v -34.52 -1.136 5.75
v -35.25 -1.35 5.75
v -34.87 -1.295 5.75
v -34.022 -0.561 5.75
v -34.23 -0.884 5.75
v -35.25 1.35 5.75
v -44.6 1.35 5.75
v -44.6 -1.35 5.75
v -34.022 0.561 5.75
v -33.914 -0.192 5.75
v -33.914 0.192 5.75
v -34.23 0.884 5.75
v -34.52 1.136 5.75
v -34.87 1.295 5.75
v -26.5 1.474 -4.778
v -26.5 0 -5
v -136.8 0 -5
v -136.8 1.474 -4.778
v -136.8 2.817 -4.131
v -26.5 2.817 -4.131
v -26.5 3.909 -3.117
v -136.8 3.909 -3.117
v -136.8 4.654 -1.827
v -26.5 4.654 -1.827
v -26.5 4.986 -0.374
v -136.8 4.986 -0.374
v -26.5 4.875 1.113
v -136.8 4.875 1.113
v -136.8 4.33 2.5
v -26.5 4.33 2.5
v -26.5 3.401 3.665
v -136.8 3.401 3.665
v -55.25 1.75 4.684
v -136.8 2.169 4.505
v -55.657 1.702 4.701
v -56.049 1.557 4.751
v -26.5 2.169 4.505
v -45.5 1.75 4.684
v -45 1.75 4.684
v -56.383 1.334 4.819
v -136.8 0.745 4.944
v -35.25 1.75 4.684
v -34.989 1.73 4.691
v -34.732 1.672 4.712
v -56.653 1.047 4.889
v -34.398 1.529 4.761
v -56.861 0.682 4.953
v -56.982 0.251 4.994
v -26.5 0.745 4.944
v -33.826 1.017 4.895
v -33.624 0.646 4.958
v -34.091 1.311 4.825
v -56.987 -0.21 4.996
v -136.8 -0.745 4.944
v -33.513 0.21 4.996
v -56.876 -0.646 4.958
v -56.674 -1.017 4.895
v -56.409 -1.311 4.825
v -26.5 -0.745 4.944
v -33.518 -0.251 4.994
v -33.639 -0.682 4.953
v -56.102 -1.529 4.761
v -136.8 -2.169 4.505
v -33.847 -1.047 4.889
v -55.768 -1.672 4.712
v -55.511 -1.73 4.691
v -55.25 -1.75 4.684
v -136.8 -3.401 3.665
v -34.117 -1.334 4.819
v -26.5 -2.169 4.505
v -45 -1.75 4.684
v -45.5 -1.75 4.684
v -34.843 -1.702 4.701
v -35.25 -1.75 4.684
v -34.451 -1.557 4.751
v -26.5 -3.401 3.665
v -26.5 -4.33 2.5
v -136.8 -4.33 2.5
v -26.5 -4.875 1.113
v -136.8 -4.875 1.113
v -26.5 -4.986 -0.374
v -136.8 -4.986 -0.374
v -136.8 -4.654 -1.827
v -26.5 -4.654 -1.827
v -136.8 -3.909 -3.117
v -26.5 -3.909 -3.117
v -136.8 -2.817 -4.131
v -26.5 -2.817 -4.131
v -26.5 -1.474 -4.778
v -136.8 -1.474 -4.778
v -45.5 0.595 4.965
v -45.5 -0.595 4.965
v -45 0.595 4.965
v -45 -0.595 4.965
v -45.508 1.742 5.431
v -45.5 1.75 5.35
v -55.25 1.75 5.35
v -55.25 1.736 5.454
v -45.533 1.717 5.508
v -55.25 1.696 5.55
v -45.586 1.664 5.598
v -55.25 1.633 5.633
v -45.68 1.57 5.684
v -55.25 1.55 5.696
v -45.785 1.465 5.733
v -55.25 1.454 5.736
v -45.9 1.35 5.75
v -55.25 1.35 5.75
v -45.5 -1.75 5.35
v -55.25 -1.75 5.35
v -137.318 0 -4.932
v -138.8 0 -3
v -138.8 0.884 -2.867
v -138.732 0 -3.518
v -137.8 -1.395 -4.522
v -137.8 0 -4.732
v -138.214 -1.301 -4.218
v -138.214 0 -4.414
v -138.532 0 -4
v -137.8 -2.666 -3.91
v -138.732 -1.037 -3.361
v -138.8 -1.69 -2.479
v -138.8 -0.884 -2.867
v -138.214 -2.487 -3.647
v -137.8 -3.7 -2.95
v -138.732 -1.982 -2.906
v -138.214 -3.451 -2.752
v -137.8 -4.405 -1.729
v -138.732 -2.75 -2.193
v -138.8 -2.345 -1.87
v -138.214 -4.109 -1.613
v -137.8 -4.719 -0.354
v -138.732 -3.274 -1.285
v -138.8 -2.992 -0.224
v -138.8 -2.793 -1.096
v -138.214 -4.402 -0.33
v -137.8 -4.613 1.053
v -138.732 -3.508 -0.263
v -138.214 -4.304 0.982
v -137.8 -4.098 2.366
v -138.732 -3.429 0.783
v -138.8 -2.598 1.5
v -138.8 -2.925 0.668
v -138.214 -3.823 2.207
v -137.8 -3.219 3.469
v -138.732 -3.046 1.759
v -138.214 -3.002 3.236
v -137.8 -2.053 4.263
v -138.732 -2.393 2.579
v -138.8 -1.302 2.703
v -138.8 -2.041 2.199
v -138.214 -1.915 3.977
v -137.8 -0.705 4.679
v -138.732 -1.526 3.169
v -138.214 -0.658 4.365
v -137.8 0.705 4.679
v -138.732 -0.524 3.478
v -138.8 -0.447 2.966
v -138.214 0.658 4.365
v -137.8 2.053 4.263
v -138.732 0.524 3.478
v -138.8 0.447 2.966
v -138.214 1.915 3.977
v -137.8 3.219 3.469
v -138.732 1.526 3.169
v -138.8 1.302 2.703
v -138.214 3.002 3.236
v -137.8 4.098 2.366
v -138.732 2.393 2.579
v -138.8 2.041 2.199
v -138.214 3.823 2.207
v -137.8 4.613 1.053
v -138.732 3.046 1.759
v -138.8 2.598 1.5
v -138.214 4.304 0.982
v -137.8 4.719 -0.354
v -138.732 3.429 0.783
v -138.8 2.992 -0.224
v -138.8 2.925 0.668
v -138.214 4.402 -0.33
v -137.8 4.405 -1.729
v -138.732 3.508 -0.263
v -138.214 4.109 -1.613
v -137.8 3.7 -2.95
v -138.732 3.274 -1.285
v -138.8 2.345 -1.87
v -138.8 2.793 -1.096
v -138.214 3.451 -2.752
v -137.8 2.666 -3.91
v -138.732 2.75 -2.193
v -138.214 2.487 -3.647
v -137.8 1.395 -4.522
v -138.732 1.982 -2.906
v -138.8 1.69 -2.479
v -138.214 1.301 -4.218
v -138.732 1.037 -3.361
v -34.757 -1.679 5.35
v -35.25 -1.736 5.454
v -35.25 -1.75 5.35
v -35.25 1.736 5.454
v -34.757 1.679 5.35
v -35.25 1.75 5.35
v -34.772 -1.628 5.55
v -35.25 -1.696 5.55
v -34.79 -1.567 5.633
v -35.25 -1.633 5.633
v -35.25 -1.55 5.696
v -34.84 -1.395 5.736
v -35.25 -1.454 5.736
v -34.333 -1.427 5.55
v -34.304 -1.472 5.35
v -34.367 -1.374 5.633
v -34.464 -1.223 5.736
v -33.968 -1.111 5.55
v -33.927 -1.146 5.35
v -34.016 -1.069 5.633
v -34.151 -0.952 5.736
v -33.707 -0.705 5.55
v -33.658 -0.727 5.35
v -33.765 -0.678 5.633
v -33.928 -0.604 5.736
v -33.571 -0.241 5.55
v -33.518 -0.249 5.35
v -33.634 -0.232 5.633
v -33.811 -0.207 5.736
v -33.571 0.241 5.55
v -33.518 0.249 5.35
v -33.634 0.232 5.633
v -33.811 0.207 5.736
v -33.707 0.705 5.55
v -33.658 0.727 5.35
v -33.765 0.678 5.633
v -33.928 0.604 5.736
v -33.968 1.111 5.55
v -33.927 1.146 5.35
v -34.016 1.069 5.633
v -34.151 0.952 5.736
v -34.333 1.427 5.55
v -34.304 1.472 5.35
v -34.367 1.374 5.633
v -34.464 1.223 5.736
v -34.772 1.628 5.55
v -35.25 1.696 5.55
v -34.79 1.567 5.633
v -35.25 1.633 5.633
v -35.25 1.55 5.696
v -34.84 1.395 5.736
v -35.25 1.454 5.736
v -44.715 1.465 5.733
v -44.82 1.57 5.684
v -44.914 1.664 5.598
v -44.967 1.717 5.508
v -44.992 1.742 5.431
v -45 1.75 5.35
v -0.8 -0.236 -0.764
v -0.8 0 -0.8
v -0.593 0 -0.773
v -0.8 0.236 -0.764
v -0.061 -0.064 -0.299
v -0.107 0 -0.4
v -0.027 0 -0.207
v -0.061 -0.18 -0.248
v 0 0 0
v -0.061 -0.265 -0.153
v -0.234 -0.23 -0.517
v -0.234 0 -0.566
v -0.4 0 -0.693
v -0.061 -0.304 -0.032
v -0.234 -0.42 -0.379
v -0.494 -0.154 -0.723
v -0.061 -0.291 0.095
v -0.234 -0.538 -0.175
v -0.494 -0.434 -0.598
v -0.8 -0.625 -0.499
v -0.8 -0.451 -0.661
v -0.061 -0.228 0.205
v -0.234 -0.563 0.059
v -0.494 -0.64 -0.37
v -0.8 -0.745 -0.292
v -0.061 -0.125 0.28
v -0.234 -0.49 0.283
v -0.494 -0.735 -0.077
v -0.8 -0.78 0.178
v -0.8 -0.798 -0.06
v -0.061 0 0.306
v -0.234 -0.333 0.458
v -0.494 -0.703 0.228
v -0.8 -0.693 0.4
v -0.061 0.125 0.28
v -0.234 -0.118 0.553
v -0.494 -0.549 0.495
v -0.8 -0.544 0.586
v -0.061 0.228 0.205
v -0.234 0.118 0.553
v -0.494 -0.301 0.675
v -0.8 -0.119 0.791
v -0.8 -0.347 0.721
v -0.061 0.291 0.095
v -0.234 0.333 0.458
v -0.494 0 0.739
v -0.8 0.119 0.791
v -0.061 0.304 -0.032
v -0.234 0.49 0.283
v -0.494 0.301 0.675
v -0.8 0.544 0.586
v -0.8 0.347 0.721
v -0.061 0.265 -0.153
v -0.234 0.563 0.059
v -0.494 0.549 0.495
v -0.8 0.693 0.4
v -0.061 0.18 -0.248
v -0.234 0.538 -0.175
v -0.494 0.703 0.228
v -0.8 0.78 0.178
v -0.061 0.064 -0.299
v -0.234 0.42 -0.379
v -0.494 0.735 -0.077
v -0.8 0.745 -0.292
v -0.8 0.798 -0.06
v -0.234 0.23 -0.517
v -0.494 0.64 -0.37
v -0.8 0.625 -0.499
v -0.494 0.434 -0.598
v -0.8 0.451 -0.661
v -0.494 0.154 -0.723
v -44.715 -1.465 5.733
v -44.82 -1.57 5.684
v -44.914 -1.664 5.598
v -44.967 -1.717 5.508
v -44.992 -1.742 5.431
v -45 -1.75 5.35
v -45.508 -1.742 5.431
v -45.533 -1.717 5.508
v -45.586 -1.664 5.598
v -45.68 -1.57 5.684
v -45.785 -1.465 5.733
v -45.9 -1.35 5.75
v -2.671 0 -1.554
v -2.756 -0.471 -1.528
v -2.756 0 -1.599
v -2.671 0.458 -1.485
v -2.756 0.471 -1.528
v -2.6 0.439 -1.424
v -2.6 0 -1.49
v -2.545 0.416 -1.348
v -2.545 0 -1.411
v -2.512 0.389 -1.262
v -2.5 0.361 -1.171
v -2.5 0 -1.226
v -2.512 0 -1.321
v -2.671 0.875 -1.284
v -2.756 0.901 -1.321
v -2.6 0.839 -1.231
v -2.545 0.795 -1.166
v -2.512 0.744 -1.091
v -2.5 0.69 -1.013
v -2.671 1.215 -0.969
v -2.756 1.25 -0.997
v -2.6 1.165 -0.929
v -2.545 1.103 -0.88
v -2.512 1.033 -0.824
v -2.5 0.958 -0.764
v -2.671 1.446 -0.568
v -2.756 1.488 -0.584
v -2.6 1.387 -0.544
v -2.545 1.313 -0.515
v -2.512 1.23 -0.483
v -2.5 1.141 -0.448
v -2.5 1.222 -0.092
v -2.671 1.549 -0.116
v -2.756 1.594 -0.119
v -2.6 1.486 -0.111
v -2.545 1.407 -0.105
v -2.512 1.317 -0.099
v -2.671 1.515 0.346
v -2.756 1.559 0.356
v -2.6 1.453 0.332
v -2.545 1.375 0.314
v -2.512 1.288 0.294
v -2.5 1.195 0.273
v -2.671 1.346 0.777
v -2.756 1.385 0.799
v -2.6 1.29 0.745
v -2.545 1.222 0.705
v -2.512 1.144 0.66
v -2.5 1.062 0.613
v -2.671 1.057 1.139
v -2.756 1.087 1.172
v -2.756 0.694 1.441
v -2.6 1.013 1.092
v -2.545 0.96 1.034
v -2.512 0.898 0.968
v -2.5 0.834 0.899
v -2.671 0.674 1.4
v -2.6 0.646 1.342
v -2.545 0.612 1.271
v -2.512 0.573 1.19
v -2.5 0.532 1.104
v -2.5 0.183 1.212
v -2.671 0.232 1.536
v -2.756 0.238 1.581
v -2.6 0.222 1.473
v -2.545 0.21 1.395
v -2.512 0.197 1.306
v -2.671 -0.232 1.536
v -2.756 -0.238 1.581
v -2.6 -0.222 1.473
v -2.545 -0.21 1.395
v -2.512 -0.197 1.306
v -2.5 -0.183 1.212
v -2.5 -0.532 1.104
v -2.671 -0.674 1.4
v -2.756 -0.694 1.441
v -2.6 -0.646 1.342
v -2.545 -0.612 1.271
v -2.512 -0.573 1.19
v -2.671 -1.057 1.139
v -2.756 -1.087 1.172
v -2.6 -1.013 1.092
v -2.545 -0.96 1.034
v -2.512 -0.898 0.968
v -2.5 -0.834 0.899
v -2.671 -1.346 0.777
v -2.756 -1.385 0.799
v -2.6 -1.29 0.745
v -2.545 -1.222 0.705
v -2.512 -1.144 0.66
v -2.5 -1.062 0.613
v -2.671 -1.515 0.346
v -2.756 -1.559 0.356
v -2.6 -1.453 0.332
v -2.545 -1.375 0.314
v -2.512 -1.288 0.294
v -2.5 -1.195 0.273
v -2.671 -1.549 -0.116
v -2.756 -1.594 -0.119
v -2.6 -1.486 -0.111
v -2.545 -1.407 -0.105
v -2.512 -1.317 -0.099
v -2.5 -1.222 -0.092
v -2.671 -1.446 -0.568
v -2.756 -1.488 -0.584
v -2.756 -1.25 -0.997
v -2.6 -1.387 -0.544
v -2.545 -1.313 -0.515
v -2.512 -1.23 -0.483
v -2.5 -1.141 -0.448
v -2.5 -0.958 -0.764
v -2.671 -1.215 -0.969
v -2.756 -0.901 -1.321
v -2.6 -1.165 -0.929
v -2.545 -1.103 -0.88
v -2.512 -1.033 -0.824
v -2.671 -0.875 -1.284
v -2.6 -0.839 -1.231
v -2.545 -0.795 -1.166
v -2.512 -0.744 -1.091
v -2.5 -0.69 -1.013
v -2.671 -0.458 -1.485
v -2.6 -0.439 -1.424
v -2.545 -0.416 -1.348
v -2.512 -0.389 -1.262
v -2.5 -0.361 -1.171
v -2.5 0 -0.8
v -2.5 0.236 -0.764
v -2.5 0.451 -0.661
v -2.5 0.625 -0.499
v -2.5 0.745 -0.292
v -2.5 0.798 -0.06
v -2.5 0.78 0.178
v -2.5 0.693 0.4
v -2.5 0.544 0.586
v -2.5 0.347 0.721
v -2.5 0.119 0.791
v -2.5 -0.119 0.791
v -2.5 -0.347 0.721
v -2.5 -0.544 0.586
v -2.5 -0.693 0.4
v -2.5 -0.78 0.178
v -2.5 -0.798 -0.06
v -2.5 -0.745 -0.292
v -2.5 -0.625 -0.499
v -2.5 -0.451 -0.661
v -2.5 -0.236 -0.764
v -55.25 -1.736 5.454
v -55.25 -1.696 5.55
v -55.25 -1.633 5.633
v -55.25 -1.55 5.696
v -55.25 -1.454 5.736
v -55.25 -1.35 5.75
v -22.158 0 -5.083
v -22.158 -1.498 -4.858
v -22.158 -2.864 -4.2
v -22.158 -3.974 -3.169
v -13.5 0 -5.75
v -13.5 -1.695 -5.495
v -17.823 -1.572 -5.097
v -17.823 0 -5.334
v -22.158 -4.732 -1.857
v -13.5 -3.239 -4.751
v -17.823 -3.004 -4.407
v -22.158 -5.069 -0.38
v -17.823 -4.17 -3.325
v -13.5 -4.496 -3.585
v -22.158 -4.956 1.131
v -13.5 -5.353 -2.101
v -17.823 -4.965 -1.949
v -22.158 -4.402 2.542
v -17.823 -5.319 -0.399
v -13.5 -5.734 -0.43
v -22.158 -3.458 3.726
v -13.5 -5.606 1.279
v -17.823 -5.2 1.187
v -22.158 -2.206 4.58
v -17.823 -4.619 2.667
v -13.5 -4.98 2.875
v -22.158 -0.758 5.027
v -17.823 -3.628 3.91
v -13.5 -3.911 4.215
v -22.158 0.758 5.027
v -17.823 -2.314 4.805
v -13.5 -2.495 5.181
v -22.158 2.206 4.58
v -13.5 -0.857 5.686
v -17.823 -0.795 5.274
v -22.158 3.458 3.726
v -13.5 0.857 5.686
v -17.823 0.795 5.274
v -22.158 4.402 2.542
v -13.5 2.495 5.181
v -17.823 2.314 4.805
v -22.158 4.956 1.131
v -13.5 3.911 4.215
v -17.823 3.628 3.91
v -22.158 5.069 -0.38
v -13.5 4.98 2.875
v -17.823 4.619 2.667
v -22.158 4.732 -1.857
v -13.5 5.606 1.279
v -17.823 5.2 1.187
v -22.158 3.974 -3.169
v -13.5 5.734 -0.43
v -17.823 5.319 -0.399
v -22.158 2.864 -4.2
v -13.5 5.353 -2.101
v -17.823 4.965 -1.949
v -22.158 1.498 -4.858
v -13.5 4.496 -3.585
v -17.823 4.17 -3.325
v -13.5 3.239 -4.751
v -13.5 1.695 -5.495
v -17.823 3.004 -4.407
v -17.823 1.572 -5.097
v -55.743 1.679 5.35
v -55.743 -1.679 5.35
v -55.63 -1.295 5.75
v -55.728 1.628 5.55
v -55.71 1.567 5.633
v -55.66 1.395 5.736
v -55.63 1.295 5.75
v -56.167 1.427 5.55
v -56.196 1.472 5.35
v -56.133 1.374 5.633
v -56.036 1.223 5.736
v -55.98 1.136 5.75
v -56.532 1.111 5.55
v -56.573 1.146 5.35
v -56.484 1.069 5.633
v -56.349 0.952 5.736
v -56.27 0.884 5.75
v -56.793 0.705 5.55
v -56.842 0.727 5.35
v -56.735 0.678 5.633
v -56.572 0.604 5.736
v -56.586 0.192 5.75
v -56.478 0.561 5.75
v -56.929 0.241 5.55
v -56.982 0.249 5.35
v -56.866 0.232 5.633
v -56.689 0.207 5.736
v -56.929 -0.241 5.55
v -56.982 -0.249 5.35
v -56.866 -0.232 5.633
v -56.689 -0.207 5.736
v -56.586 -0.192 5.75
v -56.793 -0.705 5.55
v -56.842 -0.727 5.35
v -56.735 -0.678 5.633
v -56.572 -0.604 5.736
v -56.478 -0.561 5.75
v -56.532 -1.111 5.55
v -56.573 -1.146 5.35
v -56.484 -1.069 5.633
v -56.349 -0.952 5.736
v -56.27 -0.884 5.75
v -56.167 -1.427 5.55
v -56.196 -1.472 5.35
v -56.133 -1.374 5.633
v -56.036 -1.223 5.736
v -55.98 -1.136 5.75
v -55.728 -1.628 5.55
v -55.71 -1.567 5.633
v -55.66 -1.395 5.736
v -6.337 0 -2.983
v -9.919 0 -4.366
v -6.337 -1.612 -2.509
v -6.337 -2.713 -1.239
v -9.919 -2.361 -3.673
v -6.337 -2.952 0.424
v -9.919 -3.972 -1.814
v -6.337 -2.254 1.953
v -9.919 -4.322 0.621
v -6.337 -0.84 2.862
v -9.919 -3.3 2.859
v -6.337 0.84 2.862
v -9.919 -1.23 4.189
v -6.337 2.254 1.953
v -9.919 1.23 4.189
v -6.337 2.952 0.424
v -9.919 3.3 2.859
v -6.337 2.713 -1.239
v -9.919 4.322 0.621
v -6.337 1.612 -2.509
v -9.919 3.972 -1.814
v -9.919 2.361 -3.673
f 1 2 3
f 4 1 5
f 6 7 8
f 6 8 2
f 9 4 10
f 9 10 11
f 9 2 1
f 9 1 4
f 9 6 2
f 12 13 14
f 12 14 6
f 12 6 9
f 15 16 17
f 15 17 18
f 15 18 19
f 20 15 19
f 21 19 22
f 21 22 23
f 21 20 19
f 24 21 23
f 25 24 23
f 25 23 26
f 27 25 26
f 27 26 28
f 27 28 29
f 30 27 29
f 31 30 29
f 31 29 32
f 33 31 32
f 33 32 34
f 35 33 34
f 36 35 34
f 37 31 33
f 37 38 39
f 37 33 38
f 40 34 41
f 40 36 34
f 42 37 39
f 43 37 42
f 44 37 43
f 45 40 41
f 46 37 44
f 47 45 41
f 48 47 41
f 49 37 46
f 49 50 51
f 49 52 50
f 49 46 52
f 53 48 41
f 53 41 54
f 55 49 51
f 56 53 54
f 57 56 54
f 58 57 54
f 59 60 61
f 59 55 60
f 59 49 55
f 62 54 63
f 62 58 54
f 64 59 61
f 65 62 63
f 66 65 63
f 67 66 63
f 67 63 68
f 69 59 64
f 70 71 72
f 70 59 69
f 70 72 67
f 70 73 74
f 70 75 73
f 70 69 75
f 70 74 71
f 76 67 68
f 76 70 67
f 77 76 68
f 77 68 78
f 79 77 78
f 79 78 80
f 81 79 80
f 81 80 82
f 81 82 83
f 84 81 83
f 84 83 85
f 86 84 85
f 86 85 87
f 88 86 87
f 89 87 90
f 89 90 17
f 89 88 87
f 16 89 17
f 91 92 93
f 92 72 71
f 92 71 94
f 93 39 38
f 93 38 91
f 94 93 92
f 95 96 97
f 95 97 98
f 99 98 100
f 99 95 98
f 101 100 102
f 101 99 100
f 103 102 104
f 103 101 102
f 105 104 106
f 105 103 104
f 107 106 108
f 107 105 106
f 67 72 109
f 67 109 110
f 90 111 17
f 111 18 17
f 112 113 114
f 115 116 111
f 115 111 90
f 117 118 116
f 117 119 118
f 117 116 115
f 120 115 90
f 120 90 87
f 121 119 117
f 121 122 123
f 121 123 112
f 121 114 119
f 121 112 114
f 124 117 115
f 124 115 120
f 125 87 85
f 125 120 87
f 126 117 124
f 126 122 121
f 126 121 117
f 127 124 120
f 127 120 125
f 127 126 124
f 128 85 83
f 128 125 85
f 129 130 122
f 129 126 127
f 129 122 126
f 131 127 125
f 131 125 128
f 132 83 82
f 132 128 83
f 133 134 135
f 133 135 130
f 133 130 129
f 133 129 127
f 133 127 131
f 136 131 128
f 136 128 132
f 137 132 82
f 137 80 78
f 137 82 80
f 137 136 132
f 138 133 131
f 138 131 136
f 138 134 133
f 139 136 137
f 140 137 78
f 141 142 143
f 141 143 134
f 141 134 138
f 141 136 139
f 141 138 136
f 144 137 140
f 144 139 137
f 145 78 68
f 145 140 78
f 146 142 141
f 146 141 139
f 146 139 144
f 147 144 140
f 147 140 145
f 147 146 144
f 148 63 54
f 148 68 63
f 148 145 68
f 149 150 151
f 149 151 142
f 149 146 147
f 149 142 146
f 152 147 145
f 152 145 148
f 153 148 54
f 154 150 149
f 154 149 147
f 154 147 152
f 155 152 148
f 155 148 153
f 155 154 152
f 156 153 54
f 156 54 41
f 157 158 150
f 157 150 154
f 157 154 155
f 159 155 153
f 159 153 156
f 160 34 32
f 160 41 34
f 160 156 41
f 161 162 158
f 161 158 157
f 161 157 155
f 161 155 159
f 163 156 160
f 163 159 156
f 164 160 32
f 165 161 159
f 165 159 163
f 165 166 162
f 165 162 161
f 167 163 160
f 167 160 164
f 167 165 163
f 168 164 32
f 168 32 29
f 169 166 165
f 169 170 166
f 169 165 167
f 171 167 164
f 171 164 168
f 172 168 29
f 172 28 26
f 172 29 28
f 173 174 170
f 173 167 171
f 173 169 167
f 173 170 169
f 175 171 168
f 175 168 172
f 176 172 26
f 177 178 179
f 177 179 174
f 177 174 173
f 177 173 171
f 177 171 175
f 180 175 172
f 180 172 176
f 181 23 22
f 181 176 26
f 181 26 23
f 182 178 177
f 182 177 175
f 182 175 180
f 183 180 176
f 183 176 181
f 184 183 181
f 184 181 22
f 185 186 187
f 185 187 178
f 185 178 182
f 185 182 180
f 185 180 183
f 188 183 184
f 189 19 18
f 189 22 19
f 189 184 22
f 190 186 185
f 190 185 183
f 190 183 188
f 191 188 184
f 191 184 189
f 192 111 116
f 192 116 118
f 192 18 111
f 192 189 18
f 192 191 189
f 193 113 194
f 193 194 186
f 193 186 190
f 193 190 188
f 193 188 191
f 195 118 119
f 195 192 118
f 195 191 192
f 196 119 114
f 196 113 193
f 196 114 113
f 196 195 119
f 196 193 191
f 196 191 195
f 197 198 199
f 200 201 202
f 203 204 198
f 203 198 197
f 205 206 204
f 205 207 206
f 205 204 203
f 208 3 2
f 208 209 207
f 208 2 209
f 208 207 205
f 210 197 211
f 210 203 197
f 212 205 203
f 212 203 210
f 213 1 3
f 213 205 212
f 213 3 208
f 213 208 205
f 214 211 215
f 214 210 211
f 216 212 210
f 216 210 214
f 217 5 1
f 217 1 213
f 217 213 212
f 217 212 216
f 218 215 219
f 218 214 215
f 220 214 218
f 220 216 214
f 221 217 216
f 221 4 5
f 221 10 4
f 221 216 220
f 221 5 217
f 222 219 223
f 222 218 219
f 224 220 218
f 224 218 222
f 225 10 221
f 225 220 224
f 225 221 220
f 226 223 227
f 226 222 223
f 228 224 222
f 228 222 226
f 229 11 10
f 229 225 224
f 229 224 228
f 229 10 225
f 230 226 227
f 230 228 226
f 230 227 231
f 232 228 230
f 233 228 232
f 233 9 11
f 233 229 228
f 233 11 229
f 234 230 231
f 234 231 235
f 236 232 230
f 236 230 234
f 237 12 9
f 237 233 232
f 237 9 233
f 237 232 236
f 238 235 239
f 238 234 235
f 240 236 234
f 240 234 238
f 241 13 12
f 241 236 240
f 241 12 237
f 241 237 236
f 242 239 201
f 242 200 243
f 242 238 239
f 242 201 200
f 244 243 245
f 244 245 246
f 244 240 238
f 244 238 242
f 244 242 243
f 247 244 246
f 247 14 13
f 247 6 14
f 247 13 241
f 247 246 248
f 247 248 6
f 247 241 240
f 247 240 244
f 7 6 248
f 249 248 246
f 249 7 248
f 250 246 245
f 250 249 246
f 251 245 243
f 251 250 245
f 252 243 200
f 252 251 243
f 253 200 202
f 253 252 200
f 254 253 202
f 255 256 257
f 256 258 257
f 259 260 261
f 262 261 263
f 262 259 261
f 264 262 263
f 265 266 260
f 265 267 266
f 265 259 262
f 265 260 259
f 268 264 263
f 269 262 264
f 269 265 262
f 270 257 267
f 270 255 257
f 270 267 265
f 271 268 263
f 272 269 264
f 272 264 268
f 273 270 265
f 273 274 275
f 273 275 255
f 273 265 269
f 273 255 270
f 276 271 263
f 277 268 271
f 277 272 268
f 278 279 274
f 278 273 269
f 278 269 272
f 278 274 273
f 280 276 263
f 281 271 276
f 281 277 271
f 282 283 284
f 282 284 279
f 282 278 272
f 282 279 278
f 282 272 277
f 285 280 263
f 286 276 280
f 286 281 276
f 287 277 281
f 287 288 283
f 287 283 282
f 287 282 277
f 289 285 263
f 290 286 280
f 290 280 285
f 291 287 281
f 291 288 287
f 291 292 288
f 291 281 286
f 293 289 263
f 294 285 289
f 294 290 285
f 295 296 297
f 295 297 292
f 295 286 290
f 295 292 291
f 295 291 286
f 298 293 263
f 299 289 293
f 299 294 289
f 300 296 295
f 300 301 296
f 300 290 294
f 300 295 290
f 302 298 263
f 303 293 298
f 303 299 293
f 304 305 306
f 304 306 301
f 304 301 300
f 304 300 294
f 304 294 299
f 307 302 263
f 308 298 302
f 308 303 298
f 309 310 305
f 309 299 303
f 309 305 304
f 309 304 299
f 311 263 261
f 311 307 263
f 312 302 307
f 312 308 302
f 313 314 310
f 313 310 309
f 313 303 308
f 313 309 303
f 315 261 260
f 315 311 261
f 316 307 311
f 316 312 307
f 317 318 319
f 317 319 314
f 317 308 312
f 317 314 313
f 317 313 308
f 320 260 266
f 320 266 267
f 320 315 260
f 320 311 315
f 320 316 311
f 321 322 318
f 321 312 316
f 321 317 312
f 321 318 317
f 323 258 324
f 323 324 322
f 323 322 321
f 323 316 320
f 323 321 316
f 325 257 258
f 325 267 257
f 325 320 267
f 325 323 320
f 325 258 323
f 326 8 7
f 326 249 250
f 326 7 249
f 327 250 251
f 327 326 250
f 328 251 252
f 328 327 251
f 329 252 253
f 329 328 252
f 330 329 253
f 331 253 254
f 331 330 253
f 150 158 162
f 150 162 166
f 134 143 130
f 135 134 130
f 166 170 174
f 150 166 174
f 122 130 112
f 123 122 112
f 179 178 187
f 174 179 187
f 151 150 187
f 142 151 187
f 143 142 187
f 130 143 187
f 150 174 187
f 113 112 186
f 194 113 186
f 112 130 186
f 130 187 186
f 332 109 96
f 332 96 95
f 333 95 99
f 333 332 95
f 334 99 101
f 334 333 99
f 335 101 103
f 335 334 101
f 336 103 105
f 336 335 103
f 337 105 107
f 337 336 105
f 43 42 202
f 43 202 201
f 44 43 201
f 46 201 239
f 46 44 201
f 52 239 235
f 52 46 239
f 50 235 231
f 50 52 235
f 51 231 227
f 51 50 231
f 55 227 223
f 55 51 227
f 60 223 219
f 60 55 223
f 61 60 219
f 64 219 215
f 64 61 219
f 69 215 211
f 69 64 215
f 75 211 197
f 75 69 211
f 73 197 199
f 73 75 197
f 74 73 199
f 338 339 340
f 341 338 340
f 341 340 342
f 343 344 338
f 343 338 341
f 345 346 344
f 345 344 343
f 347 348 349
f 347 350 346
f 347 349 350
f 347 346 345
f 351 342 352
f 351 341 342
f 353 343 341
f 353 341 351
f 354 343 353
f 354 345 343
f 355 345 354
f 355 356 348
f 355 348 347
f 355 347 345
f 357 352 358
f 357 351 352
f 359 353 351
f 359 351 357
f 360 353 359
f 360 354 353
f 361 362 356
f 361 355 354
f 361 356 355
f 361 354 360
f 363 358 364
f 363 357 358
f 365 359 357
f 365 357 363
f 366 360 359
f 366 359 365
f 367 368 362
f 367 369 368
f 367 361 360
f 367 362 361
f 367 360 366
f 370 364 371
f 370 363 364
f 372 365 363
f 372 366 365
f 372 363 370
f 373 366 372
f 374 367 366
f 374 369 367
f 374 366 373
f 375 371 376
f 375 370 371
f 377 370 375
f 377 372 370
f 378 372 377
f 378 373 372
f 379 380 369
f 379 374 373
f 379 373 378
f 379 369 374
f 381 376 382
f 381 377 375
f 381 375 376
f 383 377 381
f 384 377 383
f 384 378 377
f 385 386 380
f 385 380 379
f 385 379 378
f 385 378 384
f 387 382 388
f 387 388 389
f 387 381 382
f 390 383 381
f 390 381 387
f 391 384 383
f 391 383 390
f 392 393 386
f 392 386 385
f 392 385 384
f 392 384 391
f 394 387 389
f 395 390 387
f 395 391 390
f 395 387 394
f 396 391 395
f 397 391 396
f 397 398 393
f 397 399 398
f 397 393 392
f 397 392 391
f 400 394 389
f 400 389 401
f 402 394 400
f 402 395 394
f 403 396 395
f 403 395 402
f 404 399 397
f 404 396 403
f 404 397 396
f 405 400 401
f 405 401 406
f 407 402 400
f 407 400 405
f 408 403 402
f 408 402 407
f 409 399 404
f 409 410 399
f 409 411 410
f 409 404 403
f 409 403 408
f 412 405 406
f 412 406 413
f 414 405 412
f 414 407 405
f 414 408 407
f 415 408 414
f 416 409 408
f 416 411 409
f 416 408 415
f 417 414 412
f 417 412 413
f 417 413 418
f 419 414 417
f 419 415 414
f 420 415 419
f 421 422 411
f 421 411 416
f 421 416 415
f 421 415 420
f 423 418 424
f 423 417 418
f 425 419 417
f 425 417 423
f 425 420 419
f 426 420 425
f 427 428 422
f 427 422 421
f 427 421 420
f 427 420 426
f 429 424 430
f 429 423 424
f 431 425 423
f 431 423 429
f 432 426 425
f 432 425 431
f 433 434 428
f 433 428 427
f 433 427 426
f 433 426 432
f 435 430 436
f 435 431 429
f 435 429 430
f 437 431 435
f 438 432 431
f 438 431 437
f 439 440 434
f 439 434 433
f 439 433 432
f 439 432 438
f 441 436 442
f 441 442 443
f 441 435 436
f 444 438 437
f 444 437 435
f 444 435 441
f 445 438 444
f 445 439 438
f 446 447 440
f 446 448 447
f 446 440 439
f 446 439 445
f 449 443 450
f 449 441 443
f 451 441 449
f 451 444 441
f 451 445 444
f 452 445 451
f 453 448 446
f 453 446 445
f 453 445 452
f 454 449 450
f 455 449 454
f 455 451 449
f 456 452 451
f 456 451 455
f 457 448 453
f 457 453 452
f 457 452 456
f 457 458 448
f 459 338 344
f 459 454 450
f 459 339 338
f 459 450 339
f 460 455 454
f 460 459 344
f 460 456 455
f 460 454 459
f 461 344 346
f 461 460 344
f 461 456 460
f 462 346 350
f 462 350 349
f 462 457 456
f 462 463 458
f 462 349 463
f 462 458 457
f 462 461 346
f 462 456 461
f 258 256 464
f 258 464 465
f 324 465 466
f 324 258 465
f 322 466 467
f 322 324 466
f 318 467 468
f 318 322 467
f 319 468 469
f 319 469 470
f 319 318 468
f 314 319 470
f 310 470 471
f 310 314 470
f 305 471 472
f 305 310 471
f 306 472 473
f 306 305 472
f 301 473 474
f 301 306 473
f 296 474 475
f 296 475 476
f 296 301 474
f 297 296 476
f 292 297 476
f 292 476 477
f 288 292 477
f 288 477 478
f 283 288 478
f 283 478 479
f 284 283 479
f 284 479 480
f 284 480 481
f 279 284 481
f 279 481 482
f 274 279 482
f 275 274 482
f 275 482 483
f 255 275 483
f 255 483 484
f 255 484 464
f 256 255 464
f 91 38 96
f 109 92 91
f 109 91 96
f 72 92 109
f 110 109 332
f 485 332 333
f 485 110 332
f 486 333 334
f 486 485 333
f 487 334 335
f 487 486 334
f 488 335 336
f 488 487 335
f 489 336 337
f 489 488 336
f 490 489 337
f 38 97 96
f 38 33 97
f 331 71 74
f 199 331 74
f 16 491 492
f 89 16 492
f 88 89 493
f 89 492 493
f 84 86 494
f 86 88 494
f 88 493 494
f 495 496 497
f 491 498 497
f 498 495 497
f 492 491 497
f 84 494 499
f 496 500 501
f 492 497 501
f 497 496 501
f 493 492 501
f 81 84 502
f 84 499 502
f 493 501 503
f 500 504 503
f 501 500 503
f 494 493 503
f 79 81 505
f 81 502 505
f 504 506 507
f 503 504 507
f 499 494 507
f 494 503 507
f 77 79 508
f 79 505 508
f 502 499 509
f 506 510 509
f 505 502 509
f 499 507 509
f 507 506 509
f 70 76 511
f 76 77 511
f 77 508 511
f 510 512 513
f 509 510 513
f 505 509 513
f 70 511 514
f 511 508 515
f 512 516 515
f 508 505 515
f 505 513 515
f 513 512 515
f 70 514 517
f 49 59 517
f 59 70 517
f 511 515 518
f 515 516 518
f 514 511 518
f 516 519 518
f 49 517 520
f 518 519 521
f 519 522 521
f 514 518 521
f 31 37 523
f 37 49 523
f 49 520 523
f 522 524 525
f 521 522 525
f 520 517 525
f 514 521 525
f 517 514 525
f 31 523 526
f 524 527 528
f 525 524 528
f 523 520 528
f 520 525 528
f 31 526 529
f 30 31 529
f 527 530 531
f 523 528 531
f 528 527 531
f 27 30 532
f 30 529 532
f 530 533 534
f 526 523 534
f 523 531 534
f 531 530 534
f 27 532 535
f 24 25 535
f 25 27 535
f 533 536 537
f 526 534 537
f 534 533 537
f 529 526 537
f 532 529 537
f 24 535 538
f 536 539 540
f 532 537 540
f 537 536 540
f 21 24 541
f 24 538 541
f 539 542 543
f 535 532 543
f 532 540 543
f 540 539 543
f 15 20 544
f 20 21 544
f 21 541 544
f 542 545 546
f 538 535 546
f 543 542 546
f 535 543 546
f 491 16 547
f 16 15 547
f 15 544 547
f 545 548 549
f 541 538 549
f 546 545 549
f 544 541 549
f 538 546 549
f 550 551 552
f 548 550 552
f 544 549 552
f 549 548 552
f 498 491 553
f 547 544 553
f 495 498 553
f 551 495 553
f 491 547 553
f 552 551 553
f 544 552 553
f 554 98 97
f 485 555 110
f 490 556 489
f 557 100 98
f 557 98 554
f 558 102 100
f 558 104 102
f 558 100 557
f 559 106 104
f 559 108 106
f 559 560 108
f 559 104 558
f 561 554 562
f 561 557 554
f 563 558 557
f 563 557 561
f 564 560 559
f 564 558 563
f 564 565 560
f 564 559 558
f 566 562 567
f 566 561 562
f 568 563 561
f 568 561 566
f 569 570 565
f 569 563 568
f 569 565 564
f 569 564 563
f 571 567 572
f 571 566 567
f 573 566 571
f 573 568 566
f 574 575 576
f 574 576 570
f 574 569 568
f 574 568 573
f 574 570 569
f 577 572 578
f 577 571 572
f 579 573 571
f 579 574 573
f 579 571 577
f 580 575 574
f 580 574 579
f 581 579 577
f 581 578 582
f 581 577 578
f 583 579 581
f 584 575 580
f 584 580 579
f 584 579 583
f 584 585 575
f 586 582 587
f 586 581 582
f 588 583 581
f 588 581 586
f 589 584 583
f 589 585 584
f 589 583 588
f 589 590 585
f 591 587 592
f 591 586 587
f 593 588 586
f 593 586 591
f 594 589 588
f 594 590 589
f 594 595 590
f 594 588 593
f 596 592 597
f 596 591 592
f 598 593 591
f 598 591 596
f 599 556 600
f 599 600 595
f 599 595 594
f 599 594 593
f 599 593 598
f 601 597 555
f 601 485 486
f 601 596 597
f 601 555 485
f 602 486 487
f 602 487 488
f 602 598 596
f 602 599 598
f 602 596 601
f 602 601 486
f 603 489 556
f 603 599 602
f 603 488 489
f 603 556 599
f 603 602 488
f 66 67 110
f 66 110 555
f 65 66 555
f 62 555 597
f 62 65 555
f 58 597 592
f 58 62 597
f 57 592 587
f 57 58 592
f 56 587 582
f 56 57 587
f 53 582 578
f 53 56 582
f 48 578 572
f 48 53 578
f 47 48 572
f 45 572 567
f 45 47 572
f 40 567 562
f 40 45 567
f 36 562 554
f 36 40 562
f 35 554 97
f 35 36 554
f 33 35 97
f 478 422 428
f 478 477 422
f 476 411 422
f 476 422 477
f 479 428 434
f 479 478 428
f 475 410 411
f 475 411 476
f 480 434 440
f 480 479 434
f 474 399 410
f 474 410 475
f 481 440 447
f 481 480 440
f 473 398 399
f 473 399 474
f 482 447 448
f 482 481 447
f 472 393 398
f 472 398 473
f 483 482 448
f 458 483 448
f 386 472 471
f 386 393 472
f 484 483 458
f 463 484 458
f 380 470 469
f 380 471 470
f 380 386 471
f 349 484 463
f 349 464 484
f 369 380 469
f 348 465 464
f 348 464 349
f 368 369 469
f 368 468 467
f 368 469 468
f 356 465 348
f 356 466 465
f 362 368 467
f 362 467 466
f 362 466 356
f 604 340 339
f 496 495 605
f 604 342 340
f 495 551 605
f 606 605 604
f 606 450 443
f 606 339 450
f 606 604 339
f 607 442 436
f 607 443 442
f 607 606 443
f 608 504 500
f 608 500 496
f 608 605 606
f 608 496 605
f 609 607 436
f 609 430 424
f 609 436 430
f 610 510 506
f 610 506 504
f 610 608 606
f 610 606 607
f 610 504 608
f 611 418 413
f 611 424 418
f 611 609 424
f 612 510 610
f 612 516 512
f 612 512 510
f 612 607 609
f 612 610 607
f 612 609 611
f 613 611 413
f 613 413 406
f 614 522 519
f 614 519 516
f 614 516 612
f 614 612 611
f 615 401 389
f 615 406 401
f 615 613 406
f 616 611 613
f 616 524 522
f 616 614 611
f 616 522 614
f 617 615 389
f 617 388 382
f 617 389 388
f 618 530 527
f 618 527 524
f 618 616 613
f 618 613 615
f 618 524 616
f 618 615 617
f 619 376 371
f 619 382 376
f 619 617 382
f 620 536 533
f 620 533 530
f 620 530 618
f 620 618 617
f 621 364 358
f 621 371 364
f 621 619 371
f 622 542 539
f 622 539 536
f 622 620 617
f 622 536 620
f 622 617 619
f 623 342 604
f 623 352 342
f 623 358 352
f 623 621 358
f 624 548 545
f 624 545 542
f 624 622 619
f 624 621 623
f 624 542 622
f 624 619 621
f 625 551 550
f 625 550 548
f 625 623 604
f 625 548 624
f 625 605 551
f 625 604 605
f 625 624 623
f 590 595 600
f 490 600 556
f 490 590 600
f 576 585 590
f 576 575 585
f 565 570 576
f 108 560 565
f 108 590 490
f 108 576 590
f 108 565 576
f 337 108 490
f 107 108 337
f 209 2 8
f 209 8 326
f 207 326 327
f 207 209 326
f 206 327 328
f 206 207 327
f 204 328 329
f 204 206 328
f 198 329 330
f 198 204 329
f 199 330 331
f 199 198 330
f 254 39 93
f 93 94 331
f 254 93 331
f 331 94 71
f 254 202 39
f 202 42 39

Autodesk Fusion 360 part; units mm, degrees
sketch "Sketch1" plane through (0, 0, 0) normal (0, 1, 0) x (1, 0, 0)
  line L0 (-138.8, 0) -> (-138.8, 3)
  arc A0 (-136.8, 5) -> (-138.8, 3) centre (-136.8, 3) ccw
  line L1 (-136.8, 5) -> (-26.5, 5)
  arc A1 (-26.5, 5) -> (-13.5, 5.75) centre (-26.5, 118.0417) ccw
  line L2 (-13.5, 5.75) -> (-2.5, 1.5)
  line L3 (-2.5, 1.5) -> (-2.5, 0.8)
  line L4 (-2.5, 0.8) -> (-0.8, 0.8)
  arc A2 (0, 0) -> (-0.8, 0.8) centre (-0.8, 0) ccw
  line L5 (0, 5) -> (0, -5) construction
  line L6 (1.75, 0) -> (22.5, 0)
  line L7 (-138.8, 0) -> (0, 0)
  dimension "d1" = 0.8
  dimension "d2" = 2.5
  dimension "d3" = 1.5
  dimension "d4" = 11
  dimension "d5" = 5.75
  dimension "d6" = 5
  dimension "d7" = 13
  dimension "d8" = 3
  dimension "d9" = 125.3
revolve "Revolve1" add sketch "Sketch1" angle 360 about axis through (1.75, 0, 0) along (1, 0, 0)
sketch "Sketch2" plane through (0, 0, 0) normal (0, 0, 1) x (1, 0, 0)
  line L0 (-45, 1.75) -> (-45, -1.75)
  line L1 (-45, -1.75) -> (-35.25, -1.75)
  arc A0 (-35.25, -1.75) -> (-35.25, 1.75) centre (-35.25, 0) ccw
  line L2 (-35.25, 1.75) -> (-45, 1.75)
  line L3 (-45.5, 1.75) -> (-45.5, -1.75)
  line L4 (-45.5, -1.75) -> (-55.25, -1.75)
  arc A1 (-55.25, 1.75) -> (-55.25, -1.75) centre (-55.25, 0) ccw
  line L5 (-55.25, 1.75) -> (-45.5, 1.75)
  line L6 (-57, 0) -> (-33.5, 0) construction
  point P0 (-13.5, 0)
  dimension "d11" = 0.5
  dimension "d12" = 3.5
  dimension "d13" = 23.5
  dimension "d14" = 20
extrude "Extrude1" add sketch "Sketch2" along normal blind 5.75
fillet "Fillet1" radius 0.4 8 edges at (-40.125, -1.75, 5.75) (-33.5, 0, 5.75) (-40.125, 1.75, 5.75) (-50.375, 1.75, 5.75) (-57, 0, 5.75) (-50.375, -1.75, 5.75) (-45.5, 0, 5.75) (-45, 0, 5.75)
fillet "Fillet1" radius 0.4 1 edges at (-2.5, -0.5424, 1.3985)
